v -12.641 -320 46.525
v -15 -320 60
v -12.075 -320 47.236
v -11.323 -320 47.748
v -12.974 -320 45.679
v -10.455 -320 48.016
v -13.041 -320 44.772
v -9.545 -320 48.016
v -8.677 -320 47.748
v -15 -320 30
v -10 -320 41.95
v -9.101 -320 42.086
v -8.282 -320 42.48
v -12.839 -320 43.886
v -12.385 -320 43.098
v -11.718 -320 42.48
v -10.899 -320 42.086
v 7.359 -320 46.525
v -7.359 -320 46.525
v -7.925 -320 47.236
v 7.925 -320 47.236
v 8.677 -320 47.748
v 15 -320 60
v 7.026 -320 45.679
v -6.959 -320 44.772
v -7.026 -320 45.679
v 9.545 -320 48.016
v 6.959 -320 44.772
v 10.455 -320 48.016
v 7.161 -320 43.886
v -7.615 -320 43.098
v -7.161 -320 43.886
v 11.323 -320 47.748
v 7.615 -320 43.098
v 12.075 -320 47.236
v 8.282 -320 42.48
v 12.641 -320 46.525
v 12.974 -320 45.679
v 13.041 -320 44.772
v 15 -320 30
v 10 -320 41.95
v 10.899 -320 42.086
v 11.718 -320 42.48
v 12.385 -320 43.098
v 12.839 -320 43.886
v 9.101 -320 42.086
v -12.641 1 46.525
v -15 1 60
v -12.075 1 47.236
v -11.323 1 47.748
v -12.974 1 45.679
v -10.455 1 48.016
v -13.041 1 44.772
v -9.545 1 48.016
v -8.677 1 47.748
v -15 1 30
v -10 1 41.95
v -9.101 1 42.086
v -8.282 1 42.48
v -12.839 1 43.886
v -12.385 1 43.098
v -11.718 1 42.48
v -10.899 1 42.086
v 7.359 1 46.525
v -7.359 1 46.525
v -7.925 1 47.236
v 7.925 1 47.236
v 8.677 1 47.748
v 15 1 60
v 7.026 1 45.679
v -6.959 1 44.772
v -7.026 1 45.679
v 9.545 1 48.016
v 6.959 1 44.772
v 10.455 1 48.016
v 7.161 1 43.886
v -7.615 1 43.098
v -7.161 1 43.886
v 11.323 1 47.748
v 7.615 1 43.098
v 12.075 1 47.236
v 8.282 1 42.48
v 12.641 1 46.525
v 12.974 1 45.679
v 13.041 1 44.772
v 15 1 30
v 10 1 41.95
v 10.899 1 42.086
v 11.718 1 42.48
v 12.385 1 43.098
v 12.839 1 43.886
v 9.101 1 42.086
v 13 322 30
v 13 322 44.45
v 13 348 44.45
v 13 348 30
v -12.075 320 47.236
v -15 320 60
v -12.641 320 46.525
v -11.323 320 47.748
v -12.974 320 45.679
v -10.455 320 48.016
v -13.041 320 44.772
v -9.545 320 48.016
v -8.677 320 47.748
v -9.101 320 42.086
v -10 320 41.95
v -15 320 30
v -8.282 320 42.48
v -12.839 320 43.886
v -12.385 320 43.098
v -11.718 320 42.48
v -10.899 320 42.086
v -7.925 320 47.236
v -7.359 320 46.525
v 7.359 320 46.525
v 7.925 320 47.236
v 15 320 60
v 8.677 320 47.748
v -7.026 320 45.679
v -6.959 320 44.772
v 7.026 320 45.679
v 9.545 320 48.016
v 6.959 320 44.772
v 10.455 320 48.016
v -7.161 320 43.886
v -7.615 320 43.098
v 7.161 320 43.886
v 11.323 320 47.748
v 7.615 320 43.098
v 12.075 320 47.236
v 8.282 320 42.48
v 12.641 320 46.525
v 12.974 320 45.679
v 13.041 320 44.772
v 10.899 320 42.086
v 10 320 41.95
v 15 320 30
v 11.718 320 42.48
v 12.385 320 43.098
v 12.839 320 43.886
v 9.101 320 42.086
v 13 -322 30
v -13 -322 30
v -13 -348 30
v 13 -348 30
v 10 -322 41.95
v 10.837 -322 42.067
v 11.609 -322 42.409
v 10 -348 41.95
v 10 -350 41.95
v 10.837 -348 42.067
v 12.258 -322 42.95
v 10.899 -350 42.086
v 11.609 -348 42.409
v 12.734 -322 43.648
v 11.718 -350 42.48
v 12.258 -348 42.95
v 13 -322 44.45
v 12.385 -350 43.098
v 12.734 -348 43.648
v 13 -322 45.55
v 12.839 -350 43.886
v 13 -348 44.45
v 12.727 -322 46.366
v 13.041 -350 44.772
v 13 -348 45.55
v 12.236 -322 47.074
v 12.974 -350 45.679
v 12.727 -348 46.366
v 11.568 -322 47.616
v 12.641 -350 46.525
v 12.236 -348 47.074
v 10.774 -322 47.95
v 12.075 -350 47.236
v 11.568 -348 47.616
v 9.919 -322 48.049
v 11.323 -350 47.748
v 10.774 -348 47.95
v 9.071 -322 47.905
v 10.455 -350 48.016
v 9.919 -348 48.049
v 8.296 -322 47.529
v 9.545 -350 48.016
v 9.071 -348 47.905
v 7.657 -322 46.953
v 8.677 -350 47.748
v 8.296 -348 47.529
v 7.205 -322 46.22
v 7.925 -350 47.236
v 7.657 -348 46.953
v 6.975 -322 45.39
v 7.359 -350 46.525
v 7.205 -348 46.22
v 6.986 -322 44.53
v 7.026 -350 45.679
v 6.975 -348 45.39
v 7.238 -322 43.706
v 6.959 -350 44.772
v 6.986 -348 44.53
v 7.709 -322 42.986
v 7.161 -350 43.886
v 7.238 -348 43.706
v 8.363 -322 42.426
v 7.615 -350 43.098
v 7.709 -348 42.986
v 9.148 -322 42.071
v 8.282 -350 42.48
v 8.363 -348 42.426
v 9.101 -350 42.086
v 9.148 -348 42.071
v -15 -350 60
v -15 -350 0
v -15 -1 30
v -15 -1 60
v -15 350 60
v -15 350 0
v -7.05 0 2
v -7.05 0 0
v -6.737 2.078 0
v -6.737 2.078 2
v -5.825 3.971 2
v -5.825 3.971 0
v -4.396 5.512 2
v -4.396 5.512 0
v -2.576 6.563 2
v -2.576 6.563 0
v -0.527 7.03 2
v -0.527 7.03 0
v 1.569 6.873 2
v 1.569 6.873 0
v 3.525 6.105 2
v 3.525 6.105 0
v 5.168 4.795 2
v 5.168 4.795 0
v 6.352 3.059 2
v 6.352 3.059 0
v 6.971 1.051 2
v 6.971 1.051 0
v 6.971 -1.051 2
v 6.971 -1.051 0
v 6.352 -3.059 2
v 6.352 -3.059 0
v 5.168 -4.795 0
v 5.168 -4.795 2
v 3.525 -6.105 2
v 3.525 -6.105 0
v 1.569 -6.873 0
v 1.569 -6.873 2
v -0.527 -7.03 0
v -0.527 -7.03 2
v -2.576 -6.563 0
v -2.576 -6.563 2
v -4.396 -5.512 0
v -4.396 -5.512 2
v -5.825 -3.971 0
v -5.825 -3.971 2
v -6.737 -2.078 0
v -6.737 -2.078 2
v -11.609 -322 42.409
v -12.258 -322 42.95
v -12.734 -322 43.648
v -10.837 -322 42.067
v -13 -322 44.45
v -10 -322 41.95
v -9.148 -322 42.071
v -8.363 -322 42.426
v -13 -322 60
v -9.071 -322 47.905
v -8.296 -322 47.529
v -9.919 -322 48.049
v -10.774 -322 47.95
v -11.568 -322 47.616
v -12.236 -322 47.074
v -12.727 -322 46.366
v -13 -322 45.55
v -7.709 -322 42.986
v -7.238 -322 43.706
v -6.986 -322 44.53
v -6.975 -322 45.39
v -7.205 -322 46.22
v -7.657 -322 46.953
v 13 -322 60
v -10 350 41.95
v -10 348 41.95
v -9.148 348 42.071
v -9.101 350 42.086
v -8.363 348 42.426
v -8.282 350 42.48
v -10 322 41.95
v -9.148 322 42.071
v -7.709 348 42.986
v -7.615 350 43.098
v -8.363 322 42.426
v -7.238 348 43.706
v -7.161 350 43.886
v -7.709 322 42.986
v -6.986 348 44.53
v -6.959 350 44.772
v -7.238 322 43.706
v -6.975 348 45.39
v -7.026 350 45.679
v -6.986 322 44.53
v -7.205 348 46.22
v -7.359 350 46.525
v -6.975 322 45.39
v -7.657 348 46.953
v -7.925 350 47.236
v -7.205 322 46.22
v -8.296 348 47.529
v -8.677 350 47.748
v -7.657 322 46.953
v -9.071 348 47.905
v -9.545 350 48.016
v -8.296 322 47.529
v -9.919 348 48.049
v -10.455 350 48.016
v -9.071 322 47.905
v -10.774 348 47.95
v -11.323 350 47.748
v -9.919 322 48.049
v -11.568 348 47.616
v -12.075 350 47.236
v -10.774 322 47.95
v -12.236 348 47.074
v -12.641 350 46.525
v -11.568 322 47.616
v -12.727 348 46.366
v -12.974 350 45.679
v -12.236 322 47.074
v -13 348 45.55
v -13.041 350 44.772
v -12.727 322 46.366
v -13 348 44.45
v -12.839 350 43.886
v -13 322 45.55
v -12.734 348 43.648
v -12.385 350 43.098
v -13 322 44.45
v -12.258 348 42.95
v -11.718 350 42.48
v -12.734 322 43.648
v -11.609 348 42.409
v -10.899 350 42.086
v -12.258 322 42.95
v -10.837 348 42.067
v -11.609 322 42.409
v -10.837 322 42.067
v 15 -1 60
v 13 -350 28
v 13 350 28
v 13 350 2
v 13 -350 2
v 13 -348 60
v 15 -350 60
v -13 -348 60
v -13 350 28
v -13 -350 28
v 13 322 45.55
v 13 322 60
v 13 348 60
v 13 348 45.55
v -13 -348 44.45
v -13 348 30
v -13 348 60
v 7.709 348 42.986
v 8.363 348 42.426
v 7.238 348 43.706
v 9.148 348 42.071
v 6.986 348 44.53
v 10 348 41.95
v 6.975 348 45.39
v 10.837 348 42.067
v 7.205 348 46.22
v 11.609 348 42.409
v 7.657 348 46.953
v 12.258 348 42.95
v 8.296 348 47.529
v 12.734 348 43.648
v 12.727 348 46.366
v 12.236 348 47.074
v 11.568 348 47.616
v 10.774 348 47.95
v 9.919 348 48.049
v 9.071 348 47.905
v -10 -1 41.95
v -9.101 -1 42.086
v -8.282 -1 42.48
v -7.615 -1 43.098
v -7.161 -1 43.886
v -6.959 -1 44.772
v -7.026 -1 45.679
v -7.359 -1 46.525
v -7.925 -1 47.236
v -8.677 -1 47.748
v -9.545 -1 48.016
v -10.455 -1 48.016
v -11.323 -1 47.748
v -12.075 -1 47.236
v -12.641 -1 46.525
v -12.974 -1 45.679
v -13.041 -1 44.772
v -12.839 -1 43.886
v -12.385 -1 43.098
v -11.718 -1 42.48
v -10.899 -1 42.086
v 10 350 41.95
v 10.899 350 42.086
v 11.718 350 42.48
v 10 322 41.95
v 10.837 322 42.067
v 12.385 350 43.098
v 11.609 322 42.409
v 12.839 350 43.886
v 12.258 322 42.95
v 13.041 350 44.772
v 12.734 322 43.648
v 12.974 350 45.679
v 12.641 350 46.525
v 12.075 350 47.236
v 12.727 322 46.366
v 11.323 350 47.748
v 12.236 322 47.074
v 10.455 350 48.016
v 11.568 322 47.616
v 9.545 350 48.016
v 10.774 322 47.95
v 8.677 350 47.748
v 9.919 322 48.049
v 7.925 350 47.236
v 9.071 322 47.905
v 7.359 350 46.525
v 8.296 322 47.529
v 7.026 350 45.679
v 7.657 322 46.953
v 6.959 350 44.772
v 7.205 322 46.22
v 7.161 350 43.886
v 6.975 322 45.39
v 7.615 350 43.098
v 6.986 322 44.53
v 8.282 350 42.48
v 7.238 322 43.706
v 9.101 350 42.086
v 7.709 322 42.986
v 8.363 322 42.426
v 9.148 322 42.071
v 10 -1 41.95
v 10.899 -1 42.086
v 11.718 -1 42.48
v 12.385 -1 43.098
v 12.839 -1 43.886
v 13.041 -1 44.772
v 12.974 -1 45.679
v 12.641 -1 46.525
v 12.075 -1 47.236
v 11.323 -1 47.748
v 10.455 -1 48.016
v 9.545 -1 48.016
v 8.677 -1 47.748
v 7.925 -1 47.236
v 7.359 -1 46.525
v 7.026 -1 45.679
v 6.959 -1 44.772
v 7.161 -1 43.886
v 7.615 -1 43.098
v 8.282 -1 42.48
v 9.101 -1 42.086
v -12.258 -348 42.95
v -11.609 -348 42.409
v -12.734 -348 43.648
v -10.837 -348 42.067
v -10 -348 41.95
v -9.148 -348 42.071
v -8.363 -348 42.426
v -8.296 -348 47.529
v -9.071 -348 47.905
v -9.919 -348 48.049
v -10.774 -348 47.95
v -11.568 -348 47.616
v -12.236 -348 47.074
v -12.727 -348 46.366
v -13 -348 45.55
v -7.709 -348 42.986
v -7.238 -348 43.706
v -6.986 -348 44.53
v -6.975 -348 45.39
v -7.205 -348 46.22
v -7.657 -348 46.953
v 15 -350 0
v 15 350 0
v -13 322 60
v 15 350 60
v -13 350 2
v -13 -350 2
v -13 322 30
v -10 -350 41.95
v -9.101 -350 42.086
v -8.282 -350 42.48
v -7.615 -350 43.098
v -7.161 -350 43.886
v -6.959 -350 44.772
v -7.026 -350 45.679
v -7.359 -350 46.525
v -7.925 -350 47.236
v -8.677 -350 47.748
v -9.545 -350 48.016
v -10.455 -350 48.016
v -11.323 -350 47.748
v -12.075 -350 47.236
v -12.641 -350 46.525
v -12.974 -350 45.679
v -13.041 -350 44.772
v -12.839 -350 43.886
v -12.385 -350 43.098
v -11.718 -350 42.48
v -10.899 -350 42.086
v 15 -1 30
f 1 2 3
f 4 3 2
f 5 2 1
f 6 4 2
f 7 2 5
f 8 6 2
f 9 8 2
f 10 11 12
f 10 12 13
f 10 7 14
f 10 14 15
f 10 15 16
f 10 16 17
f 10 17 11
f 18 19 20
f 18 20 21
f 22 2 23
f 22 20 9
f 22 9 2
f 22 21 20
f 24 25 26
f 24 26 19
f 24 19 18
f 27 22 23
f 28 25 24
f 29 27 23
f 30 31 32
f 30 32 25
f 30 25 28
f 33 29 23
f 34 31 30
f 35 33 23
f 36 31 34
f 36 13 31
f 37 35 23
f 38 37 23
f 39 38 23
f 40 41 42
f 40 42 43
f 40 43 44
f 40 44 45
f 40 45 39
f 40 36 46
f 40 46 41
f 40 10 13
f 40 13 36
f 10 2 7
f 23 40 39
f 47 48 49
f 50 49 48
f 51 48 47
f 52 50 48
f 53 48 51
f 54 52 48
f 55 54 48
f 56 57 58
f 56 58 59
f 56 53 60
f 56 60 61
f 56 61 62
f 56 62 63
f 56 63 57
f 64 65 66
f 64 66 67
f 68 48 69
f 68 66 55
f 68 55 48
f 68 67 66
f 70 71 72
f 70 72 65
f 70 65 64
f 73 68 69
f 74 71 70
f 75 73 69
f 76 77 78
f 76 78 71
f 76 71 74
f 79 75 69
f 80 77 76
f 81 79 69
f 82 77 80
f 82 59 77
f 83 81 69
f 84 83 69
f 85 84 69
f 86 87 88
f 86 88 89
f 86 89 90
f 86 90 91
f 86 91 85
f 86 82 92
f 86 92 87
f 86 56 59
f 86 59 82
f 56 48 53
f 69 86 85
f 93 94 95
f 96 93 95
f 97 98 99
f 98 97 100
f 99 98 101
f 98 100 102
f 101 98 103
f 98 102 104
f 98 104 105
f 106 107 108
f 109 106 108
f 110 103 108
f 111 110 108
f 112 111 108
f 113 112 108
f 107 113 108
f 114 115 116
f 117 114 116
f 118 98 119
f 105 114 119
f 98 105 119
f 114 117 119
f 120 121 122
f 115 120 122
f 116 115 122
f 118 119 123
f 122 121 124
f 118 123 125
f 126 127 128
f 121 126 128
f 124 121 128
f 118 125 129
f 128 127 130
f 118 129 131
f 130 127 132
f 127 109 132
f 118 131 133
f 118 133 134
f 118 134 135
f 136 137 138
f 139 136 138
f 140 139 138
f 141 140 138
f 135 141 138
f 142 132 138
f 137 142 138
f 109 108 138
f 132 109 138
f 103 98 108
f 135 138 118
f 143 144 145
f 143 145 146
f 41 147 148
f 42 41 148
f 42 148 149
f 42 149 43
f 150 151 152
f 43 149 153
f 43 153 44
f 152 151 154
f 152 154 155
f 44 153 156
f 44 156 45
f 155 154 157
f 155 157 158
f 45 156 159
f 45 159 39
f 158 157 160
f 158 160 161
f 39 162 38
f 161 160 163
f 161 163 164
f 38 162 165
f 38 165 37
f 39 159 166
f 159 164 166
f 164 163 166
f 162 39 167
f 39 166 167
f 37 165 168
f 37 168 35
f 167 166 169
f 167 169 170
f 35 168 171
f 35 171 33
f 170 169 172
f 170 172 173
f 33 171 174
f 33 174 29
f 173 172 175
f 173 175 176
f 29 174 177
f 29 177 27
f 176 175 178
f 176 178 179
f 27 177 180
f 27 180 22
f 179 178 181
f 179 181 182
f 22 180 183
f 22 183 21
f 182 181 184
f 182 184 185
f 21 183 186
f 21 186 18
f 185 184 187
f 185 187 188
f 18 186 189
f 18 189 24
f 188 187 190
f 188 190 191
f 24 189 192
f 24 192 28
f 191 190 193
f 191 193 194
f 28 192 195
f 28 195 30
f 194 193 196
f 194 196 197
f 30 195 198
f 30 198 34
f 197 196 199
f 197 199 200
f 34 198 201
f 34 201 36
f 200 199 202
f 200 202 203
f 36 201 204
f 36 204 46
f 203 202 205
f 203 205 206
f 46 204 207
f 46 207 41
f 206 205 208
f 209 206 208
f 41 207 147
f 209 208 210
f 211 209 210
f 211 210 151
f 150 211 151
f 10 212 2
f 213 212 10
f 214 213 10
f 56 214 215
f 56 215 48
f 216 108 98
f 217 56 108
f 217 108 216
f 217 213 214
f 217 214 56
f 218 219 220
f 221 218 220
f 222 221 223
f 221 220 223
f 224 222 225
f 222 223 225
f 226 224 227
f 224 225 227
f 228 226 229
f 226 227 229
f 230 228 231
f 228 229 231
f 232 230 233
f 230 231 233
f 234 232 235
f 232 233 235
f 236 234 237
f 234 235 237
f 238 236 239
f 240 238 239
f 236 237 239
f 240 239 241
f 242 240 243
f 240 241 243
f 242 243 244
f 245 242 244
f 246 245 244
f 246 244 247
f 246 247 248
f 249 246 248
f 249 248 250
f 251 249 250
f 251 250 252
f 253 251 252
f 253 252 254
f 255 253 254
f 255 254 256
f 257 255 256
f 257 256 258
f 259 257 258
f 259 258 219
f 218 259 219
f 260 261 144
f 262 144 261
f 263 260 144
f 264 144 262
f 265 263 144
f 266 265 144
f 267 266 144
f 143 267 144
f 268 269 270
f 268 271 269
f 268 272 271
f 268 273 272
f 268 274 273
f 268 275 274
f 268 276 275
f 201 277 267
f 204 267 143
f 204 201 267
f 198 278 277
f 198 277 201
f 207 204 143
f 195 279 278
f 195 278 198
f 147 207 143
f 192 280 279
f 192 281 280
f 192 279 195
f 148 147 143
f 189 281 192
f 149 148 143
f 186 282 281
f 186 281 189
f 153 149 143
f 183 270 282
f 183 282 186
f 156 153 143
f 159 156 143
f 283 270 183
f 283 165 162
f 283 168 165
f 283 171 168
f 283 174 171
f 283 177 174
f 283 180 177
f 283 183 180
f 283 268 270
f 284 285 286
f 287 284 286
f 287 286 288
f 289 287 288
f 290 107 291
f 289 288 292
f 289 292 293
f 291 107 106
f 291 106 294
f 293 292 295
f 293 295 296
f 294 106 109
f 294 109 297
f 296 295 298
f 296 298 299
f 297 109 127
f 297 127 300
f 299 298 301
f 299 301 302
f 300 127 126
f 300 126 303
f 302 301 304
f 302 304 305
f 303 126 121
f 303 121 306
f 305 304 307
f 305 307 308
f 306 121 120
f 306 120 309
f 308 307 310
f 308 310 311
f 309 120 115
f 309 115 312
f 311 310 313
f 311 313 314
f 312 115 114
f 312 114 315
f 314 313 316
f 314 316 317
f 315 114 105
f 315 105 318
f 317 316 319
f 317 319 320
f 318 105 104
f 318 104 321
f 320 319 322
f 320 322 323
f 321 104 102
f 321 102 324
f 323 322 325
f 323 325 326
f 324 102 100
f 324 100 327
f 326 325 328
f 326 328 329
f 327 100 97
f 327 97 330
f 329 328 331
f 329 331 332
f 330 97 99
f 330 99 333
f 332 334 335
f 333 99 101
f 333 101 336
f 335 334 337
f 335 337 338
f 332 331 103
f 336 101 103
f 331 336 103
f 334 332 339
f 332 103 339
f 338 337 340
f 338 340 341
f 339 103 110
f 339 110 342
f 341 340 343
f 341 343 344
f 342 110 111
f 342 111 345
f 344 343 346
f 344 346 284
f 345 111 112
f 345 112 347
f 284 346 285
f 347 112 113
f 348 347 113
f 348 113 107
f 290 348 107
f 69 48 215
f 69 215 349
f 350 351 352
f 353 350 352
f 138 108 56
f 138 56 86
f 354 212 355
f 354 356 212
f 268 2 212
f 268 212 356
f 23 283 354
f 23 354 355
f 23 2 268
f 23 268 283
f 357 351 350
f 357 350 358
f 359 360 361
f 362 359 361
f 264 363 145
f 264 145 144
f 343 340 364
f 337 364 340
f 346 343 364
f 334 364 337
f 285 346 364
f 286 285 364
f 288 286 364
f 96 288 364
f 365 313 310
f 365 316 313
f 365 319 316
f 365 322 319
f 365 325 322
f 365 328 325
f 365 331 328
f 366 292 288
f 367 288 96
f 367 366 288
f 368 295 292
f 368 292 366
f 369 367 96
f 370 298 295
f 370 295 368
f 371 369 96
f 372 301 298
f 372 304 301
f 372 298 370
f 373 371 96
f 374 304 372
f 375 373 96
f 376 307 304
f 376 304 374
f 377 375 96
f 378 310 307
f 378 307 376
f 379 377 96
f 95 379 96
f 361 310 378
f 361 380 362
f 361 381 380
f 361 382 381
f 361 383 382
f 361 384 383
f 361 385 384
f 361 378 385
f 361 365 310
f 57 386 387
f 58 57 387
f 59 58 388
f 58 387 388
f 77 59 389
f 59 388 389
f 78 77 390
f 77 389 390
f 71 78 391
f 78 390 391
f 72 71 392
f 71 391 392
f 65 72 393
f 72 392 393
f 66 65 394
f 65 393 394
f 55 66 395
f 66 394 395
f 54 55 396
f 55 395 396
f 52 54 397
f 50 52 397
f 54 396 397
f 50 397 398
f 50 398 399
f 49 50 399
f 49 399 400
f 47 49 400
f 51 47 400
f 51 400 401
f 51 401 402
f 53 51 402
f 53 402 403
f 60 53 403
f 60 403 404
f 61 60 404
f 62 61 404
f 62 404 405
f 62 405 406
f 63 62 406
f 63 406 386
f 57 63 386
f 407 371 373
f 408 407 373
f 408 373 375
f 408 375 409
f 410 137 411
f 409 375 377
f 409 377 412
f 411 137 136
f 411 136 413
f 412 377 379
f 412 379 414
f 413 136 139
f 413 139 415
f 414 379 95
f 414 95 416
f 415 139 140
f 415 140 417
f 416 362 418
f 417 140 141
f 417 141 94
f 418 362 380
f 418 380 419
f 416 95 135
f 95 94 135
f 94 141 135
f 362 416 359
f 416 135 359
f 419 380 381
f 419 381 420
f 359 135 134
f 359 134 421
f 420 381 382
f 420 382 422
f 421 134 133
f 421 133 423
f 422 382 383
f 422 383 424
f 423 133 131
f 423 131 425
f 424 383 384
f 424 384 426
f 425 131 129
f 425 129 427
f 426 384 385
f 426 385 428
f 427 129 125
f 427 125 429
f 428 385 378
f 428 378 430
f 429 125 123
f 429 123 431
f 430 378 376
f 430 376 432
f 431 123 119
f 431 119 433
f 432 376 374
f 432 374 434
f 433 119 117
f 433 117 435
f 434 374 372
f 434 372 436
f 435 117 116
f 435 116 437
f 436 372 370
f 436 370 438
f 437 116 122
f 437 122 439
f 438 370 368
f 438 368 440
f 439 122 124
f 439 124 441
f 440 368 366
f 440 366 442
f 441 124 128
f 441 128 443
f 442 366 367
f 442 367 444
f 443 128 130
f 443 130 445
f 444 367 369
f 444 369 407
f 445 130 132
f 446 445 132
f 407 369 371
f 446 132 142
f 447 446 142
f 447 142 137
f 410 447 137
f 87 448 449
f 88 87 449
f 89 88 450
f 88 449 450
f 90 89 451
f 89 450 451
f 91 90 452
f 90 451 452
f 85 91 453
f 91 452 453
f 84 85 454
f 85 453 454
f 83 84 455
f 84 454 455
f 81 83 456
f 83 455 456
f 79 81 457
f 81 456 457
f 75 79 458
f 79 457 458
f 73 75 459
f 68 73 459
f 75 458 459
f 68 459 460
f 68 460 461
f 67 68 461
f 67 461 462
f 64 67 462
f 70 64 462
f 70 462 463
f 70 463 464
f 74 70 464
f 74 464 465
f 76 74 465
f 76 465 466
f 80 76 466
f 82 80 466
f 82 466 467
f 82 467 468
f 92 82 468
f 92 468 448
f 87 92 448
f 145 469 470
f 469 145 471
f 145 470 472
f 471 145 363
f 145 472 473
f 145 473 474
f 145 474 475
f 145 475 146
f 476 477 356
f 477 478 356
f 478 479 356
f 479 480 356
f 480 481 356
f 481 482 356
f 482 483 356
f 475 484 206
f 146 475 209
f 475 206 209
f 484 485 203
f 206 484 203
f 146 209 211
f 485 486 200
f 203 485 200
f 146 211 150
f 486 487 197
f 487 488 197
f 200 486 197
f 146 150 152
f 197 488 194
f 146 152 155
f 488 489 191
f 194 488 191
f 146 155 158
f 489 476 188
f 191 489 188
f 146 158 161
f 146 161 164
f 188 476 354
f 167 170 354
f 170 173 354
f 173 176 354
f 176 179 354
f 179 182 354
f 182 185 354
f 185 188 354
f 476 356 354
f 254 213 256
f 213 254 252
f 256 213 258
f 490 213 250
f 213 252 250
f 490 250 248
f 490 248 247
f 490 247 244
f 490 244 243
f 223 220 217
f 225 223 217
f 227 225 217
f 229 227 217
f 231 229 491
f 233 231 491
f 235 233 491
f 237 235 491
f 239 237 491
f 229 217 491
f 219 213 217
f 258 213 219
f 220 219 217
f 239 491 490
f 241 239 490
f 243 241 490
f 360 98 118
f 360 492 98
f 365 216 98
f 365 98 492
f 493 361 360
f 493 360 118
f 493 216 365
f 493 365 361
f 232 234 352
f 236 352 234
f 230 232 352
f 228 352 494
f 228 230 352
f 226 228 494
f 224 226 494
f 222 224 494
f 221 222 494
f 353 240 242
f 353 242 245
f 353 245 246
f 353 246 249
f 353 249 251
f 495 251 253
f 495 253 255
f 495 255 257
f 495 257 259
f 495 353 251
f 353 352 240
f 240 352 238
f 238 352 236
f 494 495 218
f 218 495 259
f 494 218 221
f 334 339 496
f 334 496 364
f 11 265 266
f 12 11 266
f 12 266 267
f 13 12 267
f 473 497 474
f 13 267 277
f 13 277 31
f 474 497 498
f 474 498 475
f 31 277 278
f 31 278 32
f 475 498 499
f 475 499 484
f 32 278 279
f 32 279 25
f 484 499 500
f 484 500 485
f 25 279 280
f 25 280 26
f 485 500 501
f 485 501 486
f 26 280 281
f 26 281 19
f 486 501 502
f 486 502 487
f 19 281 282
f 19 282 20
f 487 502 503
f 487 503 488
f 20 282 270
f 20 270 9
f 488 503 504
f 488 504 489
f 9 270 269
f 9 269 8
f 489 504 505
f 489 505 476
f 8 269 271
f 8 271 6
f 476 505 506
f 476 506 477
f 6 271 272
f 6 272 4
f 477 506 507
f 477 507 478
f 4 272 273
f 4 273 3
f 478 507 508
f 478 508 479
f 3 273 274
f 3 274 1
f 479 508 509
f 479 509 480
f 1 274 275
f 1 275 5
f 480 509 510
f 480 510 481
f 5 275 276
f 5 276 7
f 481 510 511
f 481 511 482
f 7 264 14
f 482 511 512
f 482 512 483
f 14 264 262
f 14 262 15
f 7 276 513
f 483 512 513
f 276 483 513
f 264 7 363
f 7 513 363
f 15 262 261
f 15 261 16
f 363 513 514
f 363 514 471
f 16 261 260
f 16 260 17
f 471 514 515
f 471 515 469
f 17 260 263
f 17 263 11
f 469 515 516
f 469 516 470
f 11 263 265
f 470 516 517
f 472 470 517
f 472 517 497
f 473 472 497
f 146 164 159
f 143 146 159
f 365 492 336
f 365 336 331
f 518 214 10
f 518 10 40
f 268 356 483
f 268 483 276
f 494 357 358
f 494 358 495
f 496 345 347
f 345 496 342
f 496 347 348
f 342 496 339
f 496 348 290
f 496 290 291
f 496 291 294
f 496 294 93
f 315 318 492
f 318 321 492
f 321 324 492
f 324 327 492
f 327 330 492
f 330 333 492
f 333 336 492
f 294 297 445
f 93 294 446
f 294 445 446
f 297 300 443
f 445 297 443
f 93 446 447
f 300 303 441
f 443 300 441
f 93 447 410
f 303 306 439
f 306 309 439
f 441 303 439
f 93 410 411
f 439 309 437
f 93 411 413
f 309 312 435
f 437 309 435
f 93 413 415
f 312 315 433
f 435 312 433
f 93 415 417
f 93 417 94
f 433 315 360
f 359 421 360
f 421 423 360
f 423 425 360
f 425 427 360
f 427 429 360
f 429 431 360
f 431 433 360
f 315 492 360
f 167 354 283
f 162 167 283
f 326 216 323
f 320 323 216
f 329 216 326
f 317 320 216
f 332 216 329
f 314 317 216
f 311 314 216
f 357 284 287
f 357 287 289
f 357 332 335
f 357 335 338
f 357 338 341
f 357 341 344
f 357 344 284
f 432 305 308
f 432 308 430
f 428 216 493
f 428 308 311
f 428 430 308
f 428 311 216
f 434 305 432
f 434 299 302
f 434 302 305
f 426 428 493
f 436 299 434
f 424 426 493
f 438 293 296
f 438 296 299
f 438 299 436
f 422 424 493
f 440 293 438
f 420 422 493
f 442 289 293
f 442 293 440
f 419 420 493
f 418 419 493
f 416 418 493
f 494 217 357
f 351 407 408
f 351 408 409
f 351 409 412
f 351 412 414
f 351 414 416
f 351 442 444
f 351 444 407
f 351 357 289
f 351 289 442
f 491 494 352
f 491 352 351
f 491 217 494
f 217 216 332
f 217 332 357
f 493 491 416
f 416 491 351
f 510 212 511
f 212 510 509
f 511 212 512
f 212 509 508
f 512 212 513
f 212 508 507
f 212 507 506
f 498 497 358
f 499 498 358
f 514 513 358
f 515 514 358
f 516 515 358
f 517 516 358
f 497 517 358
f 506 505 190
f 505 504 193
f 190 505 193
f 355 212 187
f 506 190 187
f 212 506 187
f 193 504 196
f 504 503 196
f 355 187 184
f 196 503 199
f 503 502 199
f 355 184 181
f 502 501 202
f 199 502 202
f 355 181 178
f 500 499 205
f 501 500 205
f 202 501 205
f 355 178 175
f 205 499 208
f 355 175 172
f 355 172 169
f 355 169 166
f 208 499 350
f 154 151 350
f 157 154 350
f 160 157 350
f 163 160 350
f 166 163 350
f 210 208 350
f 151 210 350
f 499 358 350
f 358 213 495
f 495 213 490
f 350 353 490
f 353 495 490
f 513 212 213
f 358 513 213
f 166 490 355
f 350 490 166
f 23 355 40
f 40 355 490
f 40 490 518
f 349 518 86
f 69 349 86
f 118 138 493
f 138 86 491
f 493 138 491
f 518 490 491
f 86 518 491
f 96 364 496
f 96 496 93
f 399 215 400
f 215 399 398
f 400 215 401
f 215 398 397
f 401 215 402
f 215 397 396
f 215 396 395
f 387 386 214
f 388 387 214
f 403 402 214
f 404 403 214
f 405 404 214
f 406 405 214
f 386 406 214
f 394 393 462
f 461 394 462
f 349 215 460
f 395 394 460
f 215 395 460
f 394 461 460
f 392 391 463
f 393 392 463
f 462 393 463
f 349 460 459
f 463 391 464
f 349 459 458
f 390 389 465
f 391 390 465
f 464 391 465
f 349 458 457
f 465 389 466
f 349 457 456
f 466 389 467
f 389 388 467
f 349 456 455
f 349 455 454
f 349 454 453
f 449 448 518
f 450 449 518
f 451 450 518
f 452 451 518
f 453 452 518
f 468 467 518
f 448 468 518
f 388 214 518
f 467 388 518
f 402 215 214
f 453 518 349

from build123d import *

# Parameters (mm, degrees)
ESQUISSE1_W                = 30
ESQUISSE1_H                = 700
BOSS_EXTRU_1_DEPTH         = 30
ESQUISSE2_W                = 30
ESQUISSE2_H                = 30
ESQUISSE2_H_2              = 2
BOSS_EXTRU_2_DEPTH         = 30
ESQUISSE3_W                = 26
ESQUISSE3_H                = 26
ENL_V_MAT_EXTRU_1_DEPTH    = 30
R_P_TITION_LIN_AIRE2_COUNT = 3
R_P_TITION_LIN_AIRE2_PITCH = 670
ESQUISSE4_W                = 26
ESQUISSE4_H                = 26
ENL_V_MAT_EXTRU_2_DEPTH    = 703.726831706
ESQUISSE5_R                = 3.05
ENL_V_MAT_EXTRU_3_DEPTH    = 703.726831706
ESQUISSE7_R                = 7.05
ENL_V_MAT_EXTRU_4_DEPTH    = 28


with BuildPart() as part:
    # Esquisse1 → Boss.-Extru.1 (new body)
    with BuildSketch(Plane.XY):
        Rectangle(ESQUISSE1_W, ESQUISSE1_H)
    extrude(amount=BOSS_EXTRU_1_DEPTH)

    # Esquisse2 → Boss.-Extru.2 (add)
    with BuildSketch(Plane.XY.offset(30)):
        with Locations((0, 335)):
            Rectangle(ESQUISSE2_W, ESQUISSE2_H)
        with Locations((0, -335)):
            Rectangle(ESQUISSE2_W, ESQUISSE2_H)
        Rectangle(ESQUISSE2_W, ESQUISSE2_H_2)
    extrude(amount=BOSS_EXTRU_2_DEPTH)

    # Esquisse3 → Enlèv. mat.-Extru.1 (cut)
    with BuildSketch(Plane.XY.offset(60)):
        with Locations((0, 335)):
            Rectangle(ESQUISSE3_W, ESQUISSE3_H)
    enl_v_mat_extru_1 = extrude(amount=-ENL_V_MAT_EXTRU_1_DEPTH, mode=Mode.SUBTRACT)

    # Répétition linéaire2: Enlèv. mat.-Extru.1 ×3
    with Locations(*[(0, -i * R_P_TITION_LIN_AIRE2_PITCH, 0) for i in range(1, R_P_TITION_LIN_AIRE2_COUNT)]):
        add(enl_v_mat_extru_1, mode=Mode.SUBTRACT)

    # Esquisse4 → Enlèv. mat.-Extru.2 (cut, through all)
    with BuildSketch(Plane(origin=(0, -350, 0), x_dir=(-1, 0, 0), z_dir=(0, -1, 0))):
        with Locations((0, -15)):
            Rectangle(ESQUISSE4_W, ESQUISSE4_H)
    extrude(amount=-ENL_V_MAT_EXTRU_2_DEPTH, mode=Mode.SUBTRACT)

    # Esquisse5 → Enlèv. mat.-Extru.3 (cut, through all)
    with BuildSketch(Plane(origin=(0, -350, 0), x_dir=(-1, 0, 0), z_dir=(0, -1, 0))):
        with Locations(Location((10, -45, 0), (0, 0, 90))):
            Circle(ESQUISSE5_R)
        with Locations(Location((-10, -45, 0), (0, 0, 90))):
            Circle(ESQUISSE5_R)
    extrude(amount=-ENL_V_MAT_EXTRU_3_DEPTH, mode=Mode.SUBTRACT)

    # Esquisse7 → Enlèv. mat.-Extru.4 (cut)
    with BuildSketch(Plane(origin=(0, 0, 0), x_dir=(-1, 0, 0), z_dir=(0, 0, -1))):
        Circle(ESQUISSE7_R)
    extrude(amount=-ENL_V_MAT_EXTRU_4_DEPTH, mode=Mode.SUBTRACT)


solid = part.part
